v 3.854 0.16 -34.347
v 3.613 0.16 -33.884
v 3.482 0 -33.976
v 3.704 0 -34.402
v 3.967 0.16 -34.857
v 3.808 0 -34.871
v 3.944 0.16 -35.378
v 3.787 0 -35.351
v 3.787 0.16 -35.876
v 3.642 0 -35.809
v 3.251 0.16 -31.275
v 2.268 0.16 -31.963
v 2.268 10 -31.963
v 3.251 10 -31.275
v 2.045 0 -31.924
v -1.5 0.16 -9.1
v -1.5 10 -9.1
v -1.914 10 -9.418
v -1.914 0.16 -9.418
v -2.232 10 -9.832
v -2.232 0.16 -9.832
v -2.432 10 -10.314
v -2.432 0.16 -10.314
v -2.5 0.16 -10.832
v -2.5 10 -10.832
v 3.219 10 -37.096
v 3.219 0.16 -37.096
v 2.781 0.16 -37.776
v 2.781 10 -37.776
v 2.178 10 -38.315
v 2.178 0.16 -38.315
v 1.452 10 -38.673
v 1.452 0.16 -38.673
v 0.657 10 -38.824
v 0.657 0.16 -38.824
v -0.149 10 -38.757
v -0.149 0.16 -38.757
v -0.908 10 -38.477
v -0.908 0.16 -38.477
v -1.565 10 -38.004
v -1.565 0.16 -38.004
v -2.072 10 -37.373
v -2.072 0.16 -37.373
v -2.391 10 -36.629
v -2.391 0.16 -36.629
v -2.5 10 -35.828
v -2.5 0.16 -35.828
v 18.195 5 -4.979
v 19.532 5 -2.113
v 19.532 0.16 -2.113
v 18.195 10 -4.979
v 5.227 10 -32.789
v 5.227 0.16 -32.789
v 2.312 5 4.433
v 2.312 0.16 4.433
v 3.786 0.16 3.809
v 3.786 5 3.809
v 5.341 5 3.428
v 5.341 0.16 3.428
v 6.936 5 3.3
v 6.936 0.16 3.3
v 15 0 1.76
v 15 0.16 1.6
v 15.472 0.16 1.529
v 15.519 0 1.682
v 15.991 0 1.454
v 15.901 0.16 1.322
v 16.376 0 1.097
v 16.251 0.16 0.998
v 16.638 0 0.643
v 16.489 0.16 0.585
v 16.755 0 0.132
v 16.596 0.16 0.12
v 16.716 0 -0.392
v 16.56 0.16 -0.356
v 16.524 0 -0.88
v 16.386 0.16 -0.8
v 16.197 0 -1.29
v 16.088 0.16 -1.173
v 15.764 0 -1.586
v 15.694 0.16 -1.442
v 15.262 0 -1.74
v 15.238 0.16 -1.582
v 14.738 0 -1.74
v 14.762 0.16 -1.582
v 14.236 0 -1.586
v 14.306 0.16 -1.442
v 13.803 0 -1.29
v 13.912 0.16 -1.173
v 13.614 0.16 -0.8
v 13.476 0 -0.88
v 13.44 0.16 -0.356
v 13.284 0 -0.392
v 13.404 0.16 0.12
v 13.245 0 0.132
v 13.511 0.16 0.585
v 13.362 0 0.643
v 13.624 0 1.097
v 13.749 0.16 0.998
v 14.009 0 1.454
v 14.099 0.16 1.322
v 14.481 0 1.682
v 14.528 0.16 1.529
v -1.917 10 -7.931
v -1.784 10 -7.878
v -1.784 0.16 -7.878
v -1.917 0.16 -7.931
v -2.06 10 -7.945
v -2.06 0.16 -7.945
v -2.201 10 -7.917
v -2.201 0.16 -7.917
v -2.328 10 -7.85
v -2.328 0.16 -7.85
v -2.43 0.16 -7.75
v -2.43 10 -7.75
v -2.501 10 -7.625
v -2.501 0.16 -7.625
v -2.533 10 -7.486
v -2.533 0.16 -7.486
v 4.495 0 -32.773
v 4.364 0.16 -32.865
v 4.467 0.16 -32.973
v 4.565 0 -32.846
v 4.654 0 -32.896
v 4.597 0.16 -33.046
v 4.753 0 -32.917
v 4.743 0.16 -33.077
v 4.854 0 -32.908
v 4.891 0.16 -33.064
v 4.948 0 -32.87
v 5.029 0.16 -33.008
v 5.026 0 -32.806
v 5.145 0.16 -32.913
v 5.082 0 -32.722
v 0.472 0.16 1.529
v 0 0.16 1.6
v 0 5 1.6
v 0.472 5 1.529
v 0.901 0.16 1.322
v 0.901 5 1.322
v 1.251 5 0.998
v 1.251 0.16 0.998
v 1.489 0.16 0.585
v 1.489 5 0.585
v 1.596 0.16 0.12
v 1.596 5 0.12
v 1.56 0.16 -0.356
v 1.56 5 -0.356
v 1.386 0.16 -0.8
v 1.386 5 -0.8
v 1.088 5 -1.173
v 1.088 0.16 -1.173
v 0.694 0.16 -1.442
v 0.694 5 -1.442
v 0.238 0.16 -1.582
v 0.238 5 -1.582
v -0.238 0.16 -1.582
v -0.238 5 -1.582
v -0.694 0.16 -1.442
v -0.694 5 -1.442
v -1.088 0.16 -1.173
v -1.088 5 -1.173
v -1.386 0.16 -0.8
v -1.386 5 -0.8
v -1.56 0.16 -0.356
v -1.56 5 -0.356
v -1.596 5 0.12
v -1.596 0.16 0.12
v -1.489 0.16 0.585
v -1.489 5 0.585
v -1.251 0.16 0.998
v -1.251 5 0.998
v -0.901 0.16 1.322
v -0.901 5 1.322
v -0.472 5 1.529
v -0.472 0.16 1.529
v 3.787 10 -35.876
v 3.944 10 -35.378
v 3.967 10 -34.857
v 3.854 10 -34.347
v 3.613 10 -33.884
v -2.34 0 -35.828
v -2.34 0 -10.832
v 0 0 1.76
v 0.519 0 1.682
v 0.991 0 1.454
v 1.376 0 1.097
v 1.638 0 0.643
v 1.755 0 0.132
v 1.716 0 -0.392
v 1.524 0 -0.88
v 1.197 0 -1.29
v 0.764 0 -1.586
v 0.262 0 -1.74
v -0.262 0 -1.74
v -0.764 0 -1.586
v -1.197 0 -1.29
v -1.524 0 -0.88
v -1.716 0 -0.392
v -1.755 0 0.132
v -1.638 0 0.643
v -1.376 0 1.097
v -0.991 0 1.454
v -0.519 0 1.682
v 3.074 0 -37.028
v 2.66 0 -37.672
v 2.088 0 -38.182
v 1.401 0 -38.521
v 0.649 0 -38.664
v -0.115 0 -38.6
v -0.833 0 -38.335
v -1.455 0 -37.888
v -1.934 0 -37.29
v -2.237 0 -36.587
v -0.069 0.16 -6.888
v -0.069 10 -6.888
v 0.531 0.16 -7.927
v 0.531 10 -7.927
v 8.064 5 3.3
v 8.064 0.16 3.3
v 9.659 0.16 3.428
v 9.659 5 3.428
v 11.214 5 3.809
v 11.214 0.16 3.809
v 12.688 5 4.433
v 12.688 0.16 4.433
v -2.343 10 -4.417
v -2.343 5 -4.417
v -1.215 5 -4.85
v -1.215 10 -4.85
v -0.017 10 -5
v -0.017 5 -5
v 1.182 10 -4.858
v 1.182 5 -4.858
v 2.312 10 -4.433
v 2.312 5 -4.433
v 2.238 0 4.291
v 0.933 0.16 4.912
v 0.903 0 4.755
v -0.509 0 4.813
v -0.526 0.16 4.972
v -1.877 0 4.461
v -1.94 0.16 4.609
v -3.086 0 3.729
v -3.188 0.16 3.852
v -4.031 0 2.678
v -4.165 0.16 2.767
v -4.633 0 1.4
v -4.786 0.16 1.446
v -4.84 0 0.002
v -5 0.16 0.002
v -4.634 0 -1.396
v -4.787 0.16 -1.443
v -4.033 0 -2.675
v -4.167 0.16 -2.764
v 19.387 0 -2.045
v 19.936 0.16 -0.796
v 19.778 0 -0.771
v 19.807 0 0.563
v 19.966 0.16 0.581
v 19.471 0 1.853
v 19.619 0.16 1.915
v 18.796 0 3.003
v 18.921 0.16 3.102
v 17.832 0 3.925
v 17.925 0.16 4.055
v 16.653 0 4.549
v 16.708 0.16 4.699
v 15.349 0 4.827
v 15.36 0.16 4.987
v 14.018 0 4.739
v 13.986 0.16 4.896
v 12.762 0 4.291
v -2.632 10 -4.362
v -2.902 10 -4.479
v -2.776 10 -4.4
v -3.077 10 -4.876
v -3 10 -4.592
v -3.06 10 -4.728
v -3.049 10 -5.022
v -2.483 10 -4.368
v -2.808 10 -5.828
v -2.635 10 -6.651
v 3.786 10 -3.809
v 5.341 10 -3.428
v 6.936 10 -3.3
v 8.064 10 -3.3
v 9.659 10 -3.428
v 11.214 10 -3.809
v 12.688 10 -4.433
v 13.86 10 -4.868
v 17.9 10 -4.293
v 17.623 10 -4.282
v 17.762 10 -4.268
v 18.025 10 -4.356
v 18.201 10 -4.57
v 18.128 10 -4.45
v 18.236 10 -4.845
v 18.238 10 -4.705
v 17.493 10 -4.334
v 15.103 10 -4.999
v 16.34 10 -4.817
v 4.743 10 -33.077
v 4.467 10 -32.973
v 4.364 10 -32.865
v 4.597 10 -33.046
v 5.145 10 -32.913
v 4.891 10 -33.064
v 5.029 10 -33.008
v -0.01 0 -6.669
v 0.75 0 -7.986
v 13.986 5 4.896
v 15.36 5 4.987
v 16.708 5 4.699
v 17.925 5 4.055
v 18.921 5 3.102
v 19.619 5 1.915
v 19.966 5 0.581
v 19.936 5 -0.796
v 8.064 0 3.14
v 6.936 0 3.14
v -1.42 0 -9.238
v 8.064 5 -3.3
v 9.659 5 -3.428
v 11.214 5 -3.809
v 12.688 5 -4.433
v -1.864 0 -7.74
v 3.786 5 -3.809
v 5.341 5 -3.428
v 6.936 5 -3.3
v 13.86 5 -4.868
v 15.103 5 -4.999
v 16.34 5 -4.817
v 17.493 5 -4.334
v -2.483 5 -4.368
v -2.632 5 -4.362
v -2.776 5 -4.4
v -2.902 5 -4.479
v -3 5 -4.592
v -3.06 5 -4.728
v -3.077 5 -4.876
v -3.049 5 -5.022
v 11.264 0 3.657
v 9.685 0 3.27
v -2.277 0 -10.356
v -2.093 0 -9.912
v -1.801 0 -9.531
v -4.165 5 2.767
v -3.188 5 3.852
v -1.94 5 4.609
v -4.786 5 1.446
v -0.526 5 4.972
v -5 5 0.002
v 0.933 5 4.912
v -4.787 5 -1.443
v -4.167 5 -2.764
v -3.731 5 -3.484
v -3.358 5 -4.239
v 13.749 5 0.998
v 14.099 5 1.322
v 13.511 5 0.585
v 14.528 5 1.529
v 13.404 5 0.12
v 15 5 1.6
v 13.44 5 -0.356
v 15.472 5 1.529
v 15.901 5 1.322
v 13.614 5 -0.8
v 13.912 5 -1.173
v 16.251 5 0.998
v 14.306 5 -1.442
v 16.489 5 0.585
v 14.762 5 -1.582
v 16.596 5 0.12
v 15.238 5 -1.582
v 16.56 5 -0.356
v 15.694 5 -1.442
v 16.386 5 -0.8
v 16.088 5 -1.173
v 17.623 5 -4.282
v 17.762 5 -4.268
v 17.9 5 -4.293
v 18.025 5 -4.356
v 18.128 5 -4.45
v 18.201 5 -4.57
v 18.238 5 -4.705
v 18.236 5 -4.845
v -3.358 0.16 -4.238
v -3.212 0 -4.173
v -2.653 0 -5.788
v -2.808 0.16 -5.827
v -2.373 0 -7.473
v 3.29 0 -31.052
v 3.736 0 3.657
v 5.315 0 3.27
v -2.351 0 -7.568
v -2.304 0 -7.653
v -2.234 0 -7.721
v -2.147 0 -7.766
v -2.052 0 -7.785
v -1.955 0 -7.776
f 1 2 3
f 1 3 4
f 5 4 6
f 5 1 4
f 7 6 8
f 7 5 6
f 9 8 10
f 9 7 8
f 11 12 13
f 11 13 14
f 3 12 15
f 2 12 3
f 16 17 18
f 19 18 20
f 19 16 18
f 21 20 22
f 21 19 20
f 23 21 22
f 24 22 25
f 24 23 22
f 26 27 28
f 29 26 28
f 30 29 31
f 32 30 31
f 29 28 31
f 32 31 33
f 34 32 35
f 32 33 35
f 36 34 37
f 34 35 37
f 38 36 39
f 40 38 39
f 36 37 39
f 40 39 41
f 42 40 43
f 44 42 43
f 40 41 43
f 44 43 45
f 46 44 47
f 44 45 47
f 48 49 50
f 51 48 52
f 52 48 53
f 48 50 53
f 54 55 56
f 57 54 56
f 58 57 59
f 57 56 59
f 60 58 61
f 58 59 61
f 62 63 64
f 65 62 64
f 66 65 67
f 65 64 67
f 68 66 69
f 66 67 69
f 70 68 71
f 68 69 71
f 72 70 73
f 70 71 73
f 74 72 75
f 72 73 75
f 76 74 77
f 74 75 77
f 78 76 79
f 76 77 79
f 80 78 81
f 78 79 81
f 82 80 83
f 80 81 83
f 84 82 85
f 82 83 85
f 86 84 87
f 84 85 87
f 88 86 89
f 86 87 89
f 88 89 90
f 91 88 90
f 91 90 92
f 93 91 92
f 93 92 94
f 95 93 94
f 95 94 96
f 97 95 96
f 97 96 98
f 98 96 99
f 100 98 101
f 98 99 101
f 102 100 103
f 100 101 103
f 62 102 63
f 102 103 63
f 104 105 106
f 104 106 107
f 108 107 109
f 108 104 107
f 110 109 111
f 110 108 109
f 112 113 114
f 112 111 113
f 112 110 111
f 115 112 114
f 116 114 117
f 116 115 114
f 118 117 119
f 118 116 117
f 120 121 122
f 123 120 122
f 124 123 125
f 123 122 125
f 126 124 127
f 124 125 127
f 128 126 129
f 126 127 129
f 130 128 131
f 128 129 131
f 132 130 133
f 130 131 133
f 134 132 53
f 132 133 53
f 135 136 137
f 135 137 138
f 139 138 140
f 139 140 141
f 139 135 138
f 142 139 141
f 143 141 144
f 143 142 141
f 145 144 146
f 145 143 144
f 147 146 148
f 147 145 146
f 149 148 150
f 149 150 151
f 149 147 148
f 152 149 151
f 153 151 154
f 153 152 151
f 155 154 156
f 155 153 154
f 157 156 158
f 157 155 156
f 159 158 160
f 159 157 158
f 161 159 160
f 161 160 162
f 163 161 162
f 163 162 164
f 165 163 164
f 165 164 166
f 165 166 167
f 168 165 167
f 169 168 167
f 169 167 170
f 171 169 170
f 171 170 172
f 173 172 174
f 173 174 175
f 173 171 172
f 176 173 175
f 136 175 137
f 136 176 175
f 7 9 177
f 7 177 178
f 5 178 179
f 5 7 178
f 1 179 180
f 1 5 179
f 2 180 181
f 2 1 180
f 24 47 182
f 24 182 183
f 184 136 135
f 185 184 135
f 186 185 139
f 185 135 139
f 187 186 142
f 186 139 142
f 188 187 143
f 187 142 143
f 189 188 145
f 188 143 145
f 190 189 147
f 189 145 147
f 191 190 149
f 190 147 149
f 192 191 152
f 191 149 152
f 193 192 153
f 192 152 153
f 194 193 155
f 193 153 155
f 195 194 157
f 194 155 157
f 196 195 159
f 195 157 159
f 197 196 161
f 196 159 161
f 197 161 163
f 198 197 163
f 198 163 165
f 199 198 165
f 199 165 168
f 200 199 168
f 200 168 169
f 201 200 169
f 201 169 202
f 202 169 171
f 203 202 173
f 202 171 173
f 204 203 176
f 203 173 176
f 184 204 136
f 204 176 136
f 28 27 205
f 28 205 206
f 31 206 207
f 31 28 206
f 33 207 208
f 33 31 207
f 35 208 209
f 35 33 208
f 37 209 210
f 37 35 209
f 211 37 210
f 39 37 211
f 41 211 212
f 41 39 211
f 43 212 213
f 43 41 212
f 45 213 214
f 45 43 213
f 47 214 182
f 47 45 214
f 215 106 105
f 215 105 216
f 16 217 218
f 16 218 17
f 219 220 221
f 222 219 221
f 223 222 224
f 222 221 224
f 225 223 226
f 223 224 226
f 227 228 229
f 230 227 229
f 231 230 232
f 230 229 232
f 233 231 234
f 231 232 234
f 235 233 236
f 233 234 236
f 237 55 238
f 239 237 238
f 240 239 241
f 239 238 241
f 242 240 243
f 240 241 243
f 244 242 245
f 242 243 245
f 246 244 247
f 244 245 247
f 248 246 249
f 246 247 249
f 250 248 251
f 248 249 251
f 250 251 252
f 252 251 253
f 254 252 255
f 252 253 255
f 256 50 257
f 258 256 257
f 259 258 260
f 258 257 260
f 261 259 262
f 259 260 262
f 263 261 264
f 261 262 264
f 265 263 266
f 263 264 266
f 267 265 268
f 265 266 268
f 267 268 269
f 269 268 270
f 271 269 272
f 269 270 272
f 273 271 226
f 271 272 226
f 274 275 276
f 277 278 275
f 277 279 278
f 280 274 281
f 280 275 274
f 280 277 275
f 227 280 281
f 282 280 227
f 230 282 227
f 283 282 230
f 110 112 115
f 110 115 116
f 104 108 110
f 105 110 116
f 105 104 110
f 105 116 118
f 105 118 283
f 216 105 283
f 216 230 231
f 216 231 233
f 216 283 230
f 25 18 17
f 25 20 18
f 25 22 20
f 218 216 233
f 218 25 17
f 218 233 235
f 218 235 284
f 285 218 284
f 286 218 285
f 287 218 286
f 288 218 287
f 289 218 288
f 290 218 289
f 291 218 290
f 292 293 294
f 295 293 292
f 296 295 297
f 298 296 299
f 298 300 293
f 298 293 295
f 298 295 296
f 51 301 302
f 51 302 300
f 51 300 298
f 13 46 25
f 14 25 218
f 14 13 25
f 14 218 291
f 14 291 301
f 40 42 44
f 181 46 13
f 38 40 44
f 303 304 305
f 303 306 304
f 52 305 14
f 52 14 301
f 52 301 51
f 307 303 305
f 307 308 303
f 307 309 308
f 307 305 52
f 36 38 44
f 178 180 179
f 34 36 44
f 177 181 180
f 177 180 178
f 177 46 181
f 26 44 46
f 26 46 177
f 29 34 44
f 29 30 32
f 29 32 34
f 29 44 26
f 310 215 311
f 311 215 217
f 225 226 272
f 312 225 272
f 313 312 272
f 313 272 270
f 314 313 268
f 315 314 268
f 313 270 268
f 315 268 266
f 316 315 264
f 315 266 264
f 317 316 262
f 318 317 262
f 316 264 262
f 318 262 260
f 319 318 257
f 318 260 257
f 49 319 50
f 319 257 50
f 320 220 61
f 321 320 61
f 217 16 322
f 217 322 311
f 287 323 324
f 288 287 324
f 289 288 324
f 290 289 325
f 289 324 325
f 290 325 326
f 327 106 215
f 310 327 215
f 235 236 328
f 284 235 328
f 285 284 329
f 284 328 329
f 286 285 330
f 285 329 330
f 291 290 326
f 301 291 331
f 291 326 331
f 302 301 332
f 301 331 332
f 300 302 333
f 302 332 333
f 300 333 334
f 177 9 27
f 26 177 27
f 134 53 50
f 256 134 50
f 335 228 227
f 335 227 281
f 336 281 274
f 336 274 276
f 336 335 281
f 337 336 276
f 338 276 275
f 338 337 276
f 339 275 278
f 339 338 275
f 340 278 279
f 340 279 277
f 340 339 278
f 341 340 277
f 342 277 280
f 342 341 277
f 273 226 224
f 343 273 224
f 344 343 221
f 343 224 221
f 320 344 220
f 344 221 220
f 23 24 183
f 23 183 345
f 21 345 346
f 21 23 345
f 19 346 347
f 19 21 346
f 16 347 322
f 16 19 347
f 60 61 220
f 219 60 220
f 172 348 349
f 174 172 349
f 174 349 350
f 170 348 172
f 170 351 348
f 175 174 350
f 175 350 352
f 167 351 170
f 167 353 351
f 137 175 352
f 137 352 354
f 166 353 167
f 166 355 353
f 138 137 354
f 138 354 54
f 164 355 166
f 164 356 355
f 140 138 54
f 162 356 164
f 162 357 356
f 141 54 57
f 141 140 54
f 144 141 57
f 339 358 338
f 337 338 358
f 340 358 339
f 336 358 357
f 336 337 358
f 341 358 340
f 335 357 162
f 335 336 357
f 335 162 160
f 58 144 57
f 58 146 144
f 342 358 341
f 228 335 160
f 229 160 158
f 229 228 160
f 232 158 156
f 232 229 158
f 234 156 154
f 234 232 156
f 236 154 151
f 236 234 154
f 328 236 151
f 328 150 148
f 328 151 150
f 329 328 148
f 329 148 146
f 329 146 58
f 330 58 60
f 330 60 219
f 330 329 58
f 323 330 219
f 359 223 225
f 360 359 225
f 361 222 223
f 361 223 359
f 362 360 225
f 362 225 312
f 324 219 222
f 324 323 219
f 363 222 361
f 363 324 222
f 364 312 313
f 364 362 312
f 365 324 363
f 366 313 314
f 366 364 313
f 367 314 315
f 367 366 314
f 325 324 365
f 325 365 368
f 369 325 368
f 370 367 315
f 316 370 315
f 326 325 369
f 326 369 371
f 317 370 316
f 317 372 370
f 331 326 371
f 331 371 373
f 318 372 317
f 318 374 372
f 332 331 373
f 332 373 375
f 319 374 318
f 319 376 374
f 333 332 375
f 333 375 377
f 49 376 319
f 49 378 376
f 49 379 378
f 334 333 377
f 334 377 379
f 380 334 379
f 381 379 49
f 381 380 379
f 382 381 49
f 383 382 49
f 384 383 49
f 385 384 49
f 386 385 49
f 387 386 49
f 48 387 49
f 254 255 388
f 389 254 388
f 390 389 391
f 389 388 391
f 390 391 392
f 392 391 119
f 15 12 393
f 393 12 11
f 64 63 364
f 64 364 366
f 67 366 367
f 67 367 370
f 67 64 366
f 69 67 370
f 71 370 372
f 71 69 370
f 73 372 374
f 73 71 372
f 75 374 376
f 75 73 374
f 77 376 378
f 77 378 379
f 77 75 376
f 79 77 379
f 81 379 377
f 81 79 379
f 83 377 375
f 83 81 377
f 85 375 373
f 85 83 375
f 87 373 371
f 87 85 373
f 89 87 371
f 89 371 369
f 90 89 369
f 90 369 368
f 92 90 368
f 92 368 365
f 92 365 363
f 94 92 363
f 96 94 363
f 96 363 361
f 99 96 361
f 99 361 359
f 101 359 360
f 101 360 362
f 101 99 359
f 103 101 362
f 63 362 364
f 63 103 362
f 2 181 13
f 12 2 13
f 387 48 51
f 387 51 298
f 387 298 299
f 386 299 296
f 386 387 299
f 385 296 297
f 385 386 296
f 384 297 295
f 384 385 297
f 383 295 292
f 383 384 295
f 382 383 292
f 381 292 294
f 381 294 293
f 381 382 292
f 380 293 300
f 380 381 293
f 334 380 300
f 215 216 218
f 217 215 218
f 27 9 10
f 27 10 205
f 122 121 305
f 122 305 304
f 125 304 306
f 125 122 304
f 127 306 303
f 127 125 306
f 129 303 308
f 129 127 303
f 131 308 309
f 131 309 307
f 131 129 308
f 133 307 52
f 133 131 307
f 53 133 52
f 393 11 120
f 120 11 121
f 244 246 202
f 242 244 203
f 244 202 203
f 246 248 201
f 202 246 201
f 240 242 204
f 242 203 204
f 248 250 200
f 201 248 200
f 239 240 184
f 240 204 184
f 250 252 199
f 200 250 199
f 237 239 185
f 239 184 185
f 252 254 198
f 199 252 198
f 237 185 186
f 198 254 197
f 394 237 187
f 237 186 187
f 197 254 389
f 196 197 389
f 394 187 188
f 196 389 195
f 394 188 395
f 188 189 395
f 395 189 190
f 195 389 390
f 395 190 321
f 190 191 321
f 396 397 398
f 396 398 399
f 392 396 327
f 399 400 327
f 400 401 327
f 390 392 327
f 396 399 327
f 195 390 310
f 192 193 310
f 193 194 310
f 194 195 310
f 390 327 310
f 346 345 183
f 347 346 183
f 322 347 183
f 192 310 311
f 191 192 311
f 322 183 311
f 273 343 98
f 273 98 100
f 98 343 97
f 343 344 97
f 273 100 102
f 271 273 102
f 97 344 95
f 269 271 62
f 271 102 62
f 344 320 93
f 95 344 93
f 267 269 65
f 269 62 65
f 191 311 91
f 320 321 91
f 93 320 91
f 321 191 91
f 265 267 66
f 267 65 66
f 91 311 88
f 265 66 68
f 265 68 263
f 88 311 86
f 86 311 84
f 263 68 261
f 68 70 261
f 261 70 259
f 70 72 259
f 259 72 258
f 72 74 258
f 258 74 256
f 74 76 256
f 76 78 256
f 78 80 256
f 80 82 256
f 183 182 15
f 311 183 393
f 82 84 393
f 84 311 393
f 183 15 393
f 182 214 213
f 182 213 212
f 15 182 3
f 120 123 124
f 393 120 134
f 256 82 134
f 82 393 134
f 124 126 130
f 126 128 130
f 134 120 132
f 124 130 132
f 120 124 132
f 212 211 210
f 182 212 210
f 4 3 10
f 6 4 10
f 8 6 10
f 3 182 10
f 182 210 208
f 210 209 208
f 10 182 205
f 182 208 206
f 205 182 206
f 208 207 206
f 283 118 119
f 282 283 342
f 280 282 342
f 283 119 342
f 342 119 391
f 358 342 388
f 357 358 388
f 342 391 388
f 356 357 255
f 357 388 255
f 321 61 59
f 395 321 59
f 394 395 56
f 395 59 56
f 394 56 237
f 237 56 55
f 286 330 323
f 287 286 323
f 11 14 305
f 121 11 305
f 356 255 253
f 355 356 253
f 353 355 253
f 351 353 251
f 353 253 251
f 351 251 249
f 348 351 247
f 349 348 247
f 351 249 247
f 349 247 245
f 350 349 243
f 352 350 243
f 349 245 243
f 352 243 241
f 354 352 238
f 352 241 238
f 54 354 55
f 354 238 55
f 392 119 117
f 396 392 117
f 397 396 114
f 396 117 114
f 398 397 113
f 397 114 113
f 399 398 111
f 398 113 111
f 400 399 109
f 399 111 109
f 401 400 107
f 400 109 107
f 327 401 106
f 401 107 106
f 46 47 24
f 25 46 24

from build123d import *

# Parameters (mm, degrees)
MAIN_BODY_DEPTH                           = 10
SKETCH1_3_R                               = 1.6
CONNECTOR_BODY_DEPTH                      = 5
DULLING_FILLET_START                      = 5
DULLING_FILLET_DEPTH                      = 6
CUT_EXTRUDE1_DEPTH                        = 45.806187552
FILLET1_R                                 = 2
FILLET2_R                                 = 0.5
ELEPHANTSFOOT_COMPENSATION_LEFT_CONF_SIZE = 0.16


with BuildPart() as part:
    # complete_sketch → main_body (new body)
    with BuildSketch(Plane(origin=(0, 0, 0), x_dir=(1, 0, 0), z_dir=(0, 1, 0))):
        with BuildLine():
            ThreePointArc((-2.5, 8.291561976), (-2.925728922, 5.40481063), (-4.166666667, 2.763853992))
            ThreePointArc((-4.166666667, 2.763853992), (-1.24767584, 4.841828683), (2.312045751, 4.433333333))
            ThreePointArc((2.312045751, 4.433333333), (4.555661111, 3.587465144), (6.936137254, 3.3))
            Line((6.936137254, 3.3), (8.063862746, 3.3))
            ThreePointArc((8.063862746, 3.3), (10.444338889, 3.587465144), (12.687954249, 4.433333333))
            ThreePointArc((12.687954249, 4.433333333), (16.605433979, 4.735248857), (19.531538935, 2.113091309))
            Line((19.531538935, 2.113091309), (3.218923361, 37.095608299))
            ThreePointArc((3.218923361, 37.095608299), (-0.149318842, 38.756641535), (-2.5, 35.827753514))
            Line((-2.5, 35.827753514), (-2.5, 8.291561976))
        make_face()
    extrude(amount=MAIN_BODY_DEPTH)

    # Sketch1<3> → connector_body (add)
    with BuildSketch(Plane(origin=(0, 0, 0), x_dir=(1, 0, 0), z_dir=(0, 1, 0))):
        with BuildLine():
            ThreePointArc((2.312045751, -4.433333333), (4.555661111, -3.587465144), (6.936137254, -3.3))
            Line((6.936137254, -3.3), (8.063862746, -3.3))
            ThreePointArc((8.063862746, -3.3), (10.444338889, -3.587465144), (12.687954249, -4.433333333))
            ThreePointArc((12.687954249, -4.433333333), (18.456219958, -3.613107195), (19.531538935, 2.113091309))
            ThreePointArc((19.531538935, 2.113091309), (16.605433979, 4.735248857), (12.687954249, 4.433333333))
            ThreePointArc((12.687954249, 4.433333333), (10.444338889, 3.587465144), (8.063862746, 3.3))
            Line((8.063862746, 3.3), (6.936137254, 3.3))
            ThreePointArc((6.936137254, 3.3), (4.555661111, 3.587465144), (2.312045751, 4.433333333))
            ThreePointArc((2.312045751, 4.433333333), (-1.24767584, 4.841828683), (-4.166666667, 2.763853992))
            ThreePointArc((-4.166666667, 2.763853992), (-3.716151374, -3.345178466), (2.312045751, -4.433333333))
        make_face()
        with Locations(Location((0, 0, 0), (0, 0, 270))):
            Circle(SKETCH1_3_R, mode=Mode.SUBTRACT)
        with Locations(Location((15, 0, 0), (0, 0, 270))):
            Circle(SKETCH1_3_R, mode=Mode.SUBTRACT)
    extrude(amount=CONNECTOR_BODY_DEPTH)

    # dulling_fillet: read off the stored shape, not the designer's step
    # dulling_fillet outline → dulling_fillet (cut)
    with BuildSketch(Plane(origin=(0, 0, 0), x_dir=(1, 0, 0), z_dir=(0, 1, 0)).offset(DULLING_FILLET_START)):
        with BuildLine():
            Line((19.531538935, 2.113091309), (18.195102647, 4.979088177))
            ThreePointArc((18.195102647, 4.979088177), (18.080055144, 4.399425861), (17.492680685, 4.334344587))
            ThreePointArc((17.492680685, 4.334344587), (18.683531845, 3.381063908), (19.531538935, 2.113091309))
        make_face()
        with BuildLine():
            ThreePointArc((-4.166666667, 2.763853992), (-3.358016887, 3.704554303), (-2.342670216, 4.417227214))
            ThreePointArc((-2.342670216, 4.417227214), (-2.902133749, 4.479151002), (-3.049464036, 5.022407651))
            ThreePointArc((-3.049464036, 5.022407651), (-3.536643042, 3.85780149), (-4.166666667, 2.763853992))
        make_face()
    extrude(amount=DULLING_FILLET_DEPTH, mode=Mode.SUBTRACT)

    # Sketch2 → Cut-Extrude1 (cut, through all)
    with BuildSketch(Plane(origin=(0, 10, 0), x_dir=(1, 0, 0), z_dir=(0, 1, 0))):
        Polygon((-2.5, 8.291561976), (-0.068911087, 6.887972137), (0.531088913, 7.927202622), (-2.5, 9.677202622), align=None)
        Polygon((4.275469015, 34.829838831), (2.267951488, 31.962806676), (3.250933941, 31.274514953), (4.861066057, 33.574021924), align=None)
    extrude(amount=-CUT_EXTRUDE1_DEPTH, mode=Mode.SUBTRACT)

    # Fillet1
    fillet1_edges = [part.edges().sort_by_distance(p)[0] for p in [
        (-2.5, 5, -9.677202622),
        (4.275469015, 5, -34.829838831),
    ]]
    fillet(fillet1_edges, radius=FILLET1_R)

    # Fillet2
    fillet2_edges = [part.edges().sort_by_distance(p)[0] for p in [
        (4.861066057, 5, -33.574021924),
        (-2.5, 5, -8.291561976),
    ]]
    fillet(fillet2_edges, radius=FILLET2_R)

    # elephantsfoot_compensation_left_conf
    elephantsfoot_compensation_left_conf_edges = [part.edges().sort_by_distance(p)[0] for p in [
        (0.231088913, 0, -7.40758738),
        (3.807634117, 0, -32.069565198),
        (2.759442715, 0, -31.618660815),
        (-2.5, 0, -23.329828337),
        (2.940555742, 0, -32.923385101),
        (-0.149318842, 0, -38.756641535),
        (3.503197421, 0, -36.48598061),
        (-2.232050808, 0, -9.83190316),
        (3.967245303, 0, -34.856804912),
        (12.379301571, 0, -17.451113833),
        (-3.049950658, 0, -5.021001256),
        (-0.926536362, 0, -7.383122321),
        (-2.266493544, 0, -7.888003391),
        (4.817488185, 0, -33.075924575),
        (-3.716151374, 0, 3.345178466),
        (18.456219958, 0, 3.613107195),
        (7.5, 0, 3.3),
        (10.444338889, 0, 3.587465144),
        (0, 0, -1.6),
        (15, 0, -1.6),
        (4.555661111, 0, 3.587465144),
        (-0.484455543, 0, -8.513527487),
    ]]
    chamfer(elephantsfoot_compensation_left_conf_edges, length=ELEPHANTSFOOT_COMPENSATION_LEFT_CONF_SIZE)


solid = part.part
